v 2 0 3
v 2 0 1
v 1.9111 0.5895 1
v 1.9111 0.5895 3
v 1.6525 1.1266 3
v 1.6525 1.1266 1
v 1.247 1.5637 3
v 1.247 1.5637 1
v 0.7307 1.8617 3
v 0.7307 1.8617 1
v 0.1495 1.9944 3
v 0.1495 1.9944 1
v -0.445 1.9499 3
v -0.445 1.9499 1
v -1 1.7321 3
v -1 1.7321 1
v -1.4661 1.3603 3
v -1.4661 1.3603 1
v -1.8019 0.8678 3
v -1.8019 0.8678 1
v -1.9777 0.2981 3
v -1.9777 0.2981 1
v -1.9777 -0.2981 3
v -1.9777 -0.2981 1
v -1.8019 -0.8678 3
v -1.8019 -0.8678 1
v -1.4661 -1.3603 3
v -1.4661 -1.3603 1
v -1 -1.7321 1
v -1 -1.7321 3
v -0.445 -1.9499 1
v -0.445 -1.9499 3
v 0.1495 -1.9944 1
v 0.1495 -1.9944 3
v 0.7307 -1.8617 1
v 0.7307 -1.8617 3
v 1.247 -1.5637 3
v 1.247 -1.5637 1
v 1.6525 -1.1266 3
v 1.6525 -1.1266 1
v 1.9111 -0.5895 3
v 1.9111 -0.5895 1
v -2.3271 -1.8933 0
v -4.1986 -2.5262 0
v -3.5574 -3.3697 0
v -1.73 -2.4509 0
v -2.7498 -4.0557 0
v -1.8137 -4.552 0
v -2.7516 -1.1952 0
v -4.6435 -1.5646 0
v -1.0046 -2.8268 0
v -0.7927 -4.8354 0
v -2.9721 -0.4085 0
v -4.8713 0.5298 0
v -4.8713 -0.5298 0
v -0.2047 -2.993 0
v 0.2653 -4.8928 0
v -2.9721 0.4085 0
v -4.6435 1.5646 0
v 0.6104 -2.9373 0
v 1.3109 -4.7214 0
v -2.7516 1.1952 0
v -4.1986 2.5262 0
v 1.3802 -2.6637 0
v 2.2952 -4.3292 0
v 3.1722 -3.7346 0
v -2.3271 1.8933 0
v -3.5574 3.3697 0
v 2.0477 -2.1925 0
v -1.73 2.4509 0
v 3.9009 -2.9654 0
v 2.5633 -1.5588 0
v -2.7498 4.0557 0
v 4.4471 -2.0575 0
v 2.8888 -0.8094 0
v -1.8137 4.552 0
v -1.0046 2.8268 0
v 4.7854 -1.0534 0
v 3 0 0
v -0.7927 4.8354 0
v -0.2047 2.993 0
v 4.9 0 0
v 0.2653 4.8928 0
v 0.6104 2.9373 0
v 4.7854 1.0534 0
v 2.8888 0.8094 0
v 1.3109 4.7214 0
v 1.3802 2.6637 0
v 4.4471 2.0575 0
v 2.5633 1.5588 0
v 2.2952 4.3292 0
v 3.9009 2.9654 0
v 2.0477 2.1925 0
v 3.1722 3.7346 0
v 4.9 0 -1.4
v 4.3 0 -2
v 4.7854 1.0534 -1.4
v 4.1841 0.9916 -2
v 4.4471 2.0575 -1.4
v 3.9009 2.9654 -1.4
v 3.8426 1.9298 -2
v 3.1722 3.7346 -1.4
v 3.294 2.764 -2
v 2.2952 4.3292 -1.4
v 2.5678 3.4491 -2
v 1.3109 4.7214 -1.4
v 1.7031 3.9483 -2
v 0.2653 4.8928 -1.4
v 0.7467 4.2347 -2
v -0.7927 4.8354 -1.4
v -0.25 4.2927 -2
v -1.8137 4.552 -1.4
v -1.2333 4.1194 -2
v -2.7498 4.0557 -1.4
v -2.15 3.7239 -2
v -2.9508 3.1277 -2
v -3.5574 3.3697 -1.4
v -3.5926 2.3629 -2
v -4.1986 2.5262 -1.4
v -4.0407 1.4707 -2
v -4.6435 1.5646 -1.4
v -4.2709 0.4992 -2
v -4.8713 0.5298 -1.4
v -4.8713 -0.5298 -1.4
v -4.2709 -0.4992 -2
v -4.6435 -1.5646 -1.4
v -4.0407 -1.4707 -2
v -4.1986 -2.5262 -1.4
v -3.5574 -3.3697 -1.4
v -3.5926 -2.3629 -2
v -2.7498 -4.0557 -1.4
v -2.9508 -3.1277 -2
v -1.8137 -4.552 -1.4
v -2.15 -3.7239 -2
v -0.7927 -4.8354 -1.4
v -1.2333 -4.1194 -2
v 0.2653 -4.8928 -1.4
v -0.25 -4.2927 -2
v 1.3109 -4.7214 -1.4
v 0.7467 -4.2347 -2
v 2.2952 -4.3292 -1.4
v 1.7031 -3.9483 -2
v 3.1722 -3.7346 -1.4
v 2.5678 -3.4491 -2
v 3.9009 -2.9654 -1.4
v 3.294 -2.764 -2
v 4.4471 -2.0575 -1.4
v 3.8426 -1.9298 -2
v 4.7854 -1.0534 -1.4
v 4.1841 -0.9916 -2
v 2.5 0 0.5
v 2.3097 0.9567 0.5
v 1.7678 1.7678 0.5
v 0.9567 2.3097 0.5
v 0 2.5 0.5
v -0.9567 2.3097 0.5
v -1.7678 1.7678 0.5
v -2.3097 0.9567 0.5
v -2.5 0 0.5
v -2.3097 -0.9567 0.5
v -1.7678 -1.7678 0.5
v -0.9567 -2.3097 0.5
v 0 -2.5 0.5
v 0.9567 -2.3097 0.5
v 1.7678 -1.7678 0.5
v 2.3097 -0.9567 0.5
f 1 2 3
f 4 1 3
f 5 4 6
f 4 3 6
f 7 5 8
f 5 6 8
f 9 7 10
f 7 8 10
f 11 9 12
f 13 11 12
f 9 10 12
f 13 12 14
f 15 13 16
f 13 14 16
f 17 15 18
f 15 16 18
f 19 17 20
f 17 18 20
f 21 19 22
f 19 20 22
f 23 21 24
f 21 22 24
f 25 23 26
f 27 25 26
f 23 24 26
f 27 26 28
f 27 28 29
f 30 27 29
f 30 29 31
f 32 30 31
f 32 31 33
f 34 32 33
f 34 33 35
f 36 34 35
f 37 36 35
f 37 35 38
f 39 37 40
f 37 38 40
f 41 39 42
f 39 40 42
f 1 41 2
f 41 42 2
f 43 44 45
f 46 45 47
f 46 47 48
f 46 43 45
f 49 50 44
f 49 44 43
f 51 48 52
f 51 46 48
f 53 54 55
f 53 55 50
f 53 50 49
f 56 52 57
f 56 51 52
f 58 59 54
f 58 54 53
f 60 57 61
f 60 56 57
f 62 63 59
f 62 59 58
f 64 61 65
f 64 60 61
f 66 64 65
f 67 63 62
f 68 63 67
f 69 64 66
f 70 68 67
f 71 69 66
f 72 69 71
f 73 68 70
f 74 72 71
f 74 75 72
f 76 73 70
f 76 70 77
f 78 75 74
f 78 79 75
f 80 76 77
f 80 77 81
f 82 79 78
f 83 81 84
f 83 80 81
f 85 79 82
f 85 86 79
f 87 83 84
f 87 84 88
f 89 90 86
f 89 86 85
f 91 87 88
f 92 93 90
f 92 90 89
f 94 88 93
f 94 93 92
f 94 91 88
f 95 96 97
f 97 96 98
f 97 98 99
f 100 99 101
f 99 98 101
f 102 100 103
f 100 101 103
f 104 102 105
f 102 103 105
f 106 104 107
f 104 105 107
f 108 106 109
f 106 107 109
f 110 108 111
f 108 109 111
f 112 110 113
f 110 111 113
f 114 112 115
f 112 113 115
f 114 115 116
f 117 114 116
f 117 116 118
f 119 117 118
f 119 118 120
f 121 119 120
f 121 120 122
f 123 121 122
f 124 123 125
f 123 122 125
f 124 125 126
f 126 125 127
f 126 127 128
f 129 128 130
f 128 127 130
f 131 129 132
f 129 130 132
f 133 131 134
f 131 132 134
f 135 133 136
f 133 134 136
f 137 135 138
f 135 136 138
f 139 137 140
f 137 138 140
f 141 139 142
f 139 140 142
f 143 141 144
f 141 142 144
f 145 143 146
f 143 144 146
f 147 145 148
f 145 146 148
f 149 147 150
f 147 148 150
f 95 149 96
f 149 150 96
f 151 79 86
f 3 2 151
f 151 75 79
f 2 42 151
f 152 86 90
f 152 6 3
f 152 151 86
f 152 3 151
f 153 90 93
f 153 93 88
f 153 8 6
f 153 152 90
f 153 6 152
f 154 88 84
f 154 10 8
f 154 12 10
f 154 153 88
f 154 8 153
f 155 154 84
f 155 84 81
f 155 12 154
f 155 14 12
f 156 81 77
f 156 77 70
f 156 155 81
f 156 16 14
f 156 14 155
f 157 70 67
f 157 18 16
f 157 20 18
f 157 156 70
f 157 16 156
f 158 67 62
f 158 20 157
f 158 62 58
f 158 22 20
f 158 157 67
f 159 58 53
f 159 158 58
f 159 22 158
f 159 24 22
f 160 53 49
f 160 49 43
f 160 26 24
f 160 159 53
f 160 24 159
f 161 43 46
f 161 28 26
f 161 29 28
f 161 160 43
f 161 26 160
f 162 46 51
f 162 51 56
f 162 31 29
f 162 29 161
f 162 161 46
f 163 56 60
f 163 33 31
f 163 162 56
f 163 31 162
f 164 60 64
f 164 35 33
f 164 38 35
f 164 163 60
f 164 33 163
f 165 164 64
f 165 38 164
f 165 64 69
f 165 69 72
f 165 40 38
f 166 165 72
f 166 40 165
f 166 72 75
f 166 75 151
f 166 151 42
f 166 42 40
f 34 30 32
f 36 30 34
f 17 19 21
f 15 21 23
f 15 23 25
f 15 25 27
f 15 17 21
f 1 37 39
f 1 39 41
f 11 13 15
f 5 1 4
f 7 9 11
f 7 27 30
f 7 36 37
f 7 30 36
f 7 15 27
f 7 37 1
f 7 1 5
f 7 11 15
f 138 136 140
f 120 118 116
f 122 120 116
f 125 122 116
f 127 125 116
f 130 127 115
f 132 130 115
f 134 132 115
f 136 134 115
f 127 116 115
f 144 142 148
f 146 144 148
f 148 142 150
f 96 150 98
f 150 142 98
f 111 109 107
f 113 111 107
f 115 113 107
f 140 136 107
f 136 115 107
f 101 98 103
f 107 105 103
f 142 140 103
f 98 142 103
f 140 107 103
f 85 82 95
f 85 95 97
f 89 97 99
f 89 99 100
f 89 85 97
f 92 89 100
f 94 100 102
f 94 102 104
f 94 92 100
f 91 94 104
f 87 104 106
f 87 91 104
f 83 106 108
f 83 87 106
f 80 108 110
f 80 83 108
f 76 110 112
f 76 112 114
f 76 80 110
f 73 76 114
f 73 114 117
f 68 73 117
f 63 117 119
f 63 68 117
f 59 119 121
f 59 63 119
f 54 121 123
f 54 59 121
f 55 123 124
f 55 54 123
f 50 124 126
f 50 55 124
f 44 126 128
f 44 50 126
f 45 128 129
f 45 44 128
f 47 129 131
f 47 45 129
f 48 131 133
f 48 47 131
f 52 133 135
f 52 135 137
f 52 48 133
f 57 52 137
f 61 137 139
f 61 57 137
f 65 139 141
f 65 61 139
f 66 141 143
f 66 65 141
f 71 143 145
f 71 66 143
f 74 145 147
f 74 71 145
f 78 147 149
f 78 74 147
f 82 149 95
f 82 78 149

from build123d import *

# Parameters (mm, degrees)
SKETCH_R        = 4.9
PAD_DEPTH       = 2
SKETCH001_R     = 2
PAD001_DEPTH    = 3
CHAMFER_SIZE    = 1
CHAMFER001_SIZE = 0.6


with BuildPart() as part:
    # Sketch → Pad (new body)
    with BuildSketch(Plane.XY):
        Circle(SKETCH_R)
    extrude(amount=-PAD_DEPTH)

    # Sketch001 → Pad001 (join)
    with BuildSketch(Plane.XY):
        Circle(SKETCH001_R)
    extrude(amount=PAD001_DEPTH)

    # Chamfer
    chamfer_edges = [part.edges().sort_by_distance(p)[0] for p in [
        (-2, 0, 0),
    ]]
    chamfer(chamfer_edges, length=CHAMFER_SIZE)

    # Chamfer001
    chamfer001_edges = [part.edges().sort_by_distance(p)[0] for p in [
        (-4.9, 0, -2),
    ]]
    chamfer(chamfer001_edges, length=CHAMFER001_SIZE)


solid = part.part
